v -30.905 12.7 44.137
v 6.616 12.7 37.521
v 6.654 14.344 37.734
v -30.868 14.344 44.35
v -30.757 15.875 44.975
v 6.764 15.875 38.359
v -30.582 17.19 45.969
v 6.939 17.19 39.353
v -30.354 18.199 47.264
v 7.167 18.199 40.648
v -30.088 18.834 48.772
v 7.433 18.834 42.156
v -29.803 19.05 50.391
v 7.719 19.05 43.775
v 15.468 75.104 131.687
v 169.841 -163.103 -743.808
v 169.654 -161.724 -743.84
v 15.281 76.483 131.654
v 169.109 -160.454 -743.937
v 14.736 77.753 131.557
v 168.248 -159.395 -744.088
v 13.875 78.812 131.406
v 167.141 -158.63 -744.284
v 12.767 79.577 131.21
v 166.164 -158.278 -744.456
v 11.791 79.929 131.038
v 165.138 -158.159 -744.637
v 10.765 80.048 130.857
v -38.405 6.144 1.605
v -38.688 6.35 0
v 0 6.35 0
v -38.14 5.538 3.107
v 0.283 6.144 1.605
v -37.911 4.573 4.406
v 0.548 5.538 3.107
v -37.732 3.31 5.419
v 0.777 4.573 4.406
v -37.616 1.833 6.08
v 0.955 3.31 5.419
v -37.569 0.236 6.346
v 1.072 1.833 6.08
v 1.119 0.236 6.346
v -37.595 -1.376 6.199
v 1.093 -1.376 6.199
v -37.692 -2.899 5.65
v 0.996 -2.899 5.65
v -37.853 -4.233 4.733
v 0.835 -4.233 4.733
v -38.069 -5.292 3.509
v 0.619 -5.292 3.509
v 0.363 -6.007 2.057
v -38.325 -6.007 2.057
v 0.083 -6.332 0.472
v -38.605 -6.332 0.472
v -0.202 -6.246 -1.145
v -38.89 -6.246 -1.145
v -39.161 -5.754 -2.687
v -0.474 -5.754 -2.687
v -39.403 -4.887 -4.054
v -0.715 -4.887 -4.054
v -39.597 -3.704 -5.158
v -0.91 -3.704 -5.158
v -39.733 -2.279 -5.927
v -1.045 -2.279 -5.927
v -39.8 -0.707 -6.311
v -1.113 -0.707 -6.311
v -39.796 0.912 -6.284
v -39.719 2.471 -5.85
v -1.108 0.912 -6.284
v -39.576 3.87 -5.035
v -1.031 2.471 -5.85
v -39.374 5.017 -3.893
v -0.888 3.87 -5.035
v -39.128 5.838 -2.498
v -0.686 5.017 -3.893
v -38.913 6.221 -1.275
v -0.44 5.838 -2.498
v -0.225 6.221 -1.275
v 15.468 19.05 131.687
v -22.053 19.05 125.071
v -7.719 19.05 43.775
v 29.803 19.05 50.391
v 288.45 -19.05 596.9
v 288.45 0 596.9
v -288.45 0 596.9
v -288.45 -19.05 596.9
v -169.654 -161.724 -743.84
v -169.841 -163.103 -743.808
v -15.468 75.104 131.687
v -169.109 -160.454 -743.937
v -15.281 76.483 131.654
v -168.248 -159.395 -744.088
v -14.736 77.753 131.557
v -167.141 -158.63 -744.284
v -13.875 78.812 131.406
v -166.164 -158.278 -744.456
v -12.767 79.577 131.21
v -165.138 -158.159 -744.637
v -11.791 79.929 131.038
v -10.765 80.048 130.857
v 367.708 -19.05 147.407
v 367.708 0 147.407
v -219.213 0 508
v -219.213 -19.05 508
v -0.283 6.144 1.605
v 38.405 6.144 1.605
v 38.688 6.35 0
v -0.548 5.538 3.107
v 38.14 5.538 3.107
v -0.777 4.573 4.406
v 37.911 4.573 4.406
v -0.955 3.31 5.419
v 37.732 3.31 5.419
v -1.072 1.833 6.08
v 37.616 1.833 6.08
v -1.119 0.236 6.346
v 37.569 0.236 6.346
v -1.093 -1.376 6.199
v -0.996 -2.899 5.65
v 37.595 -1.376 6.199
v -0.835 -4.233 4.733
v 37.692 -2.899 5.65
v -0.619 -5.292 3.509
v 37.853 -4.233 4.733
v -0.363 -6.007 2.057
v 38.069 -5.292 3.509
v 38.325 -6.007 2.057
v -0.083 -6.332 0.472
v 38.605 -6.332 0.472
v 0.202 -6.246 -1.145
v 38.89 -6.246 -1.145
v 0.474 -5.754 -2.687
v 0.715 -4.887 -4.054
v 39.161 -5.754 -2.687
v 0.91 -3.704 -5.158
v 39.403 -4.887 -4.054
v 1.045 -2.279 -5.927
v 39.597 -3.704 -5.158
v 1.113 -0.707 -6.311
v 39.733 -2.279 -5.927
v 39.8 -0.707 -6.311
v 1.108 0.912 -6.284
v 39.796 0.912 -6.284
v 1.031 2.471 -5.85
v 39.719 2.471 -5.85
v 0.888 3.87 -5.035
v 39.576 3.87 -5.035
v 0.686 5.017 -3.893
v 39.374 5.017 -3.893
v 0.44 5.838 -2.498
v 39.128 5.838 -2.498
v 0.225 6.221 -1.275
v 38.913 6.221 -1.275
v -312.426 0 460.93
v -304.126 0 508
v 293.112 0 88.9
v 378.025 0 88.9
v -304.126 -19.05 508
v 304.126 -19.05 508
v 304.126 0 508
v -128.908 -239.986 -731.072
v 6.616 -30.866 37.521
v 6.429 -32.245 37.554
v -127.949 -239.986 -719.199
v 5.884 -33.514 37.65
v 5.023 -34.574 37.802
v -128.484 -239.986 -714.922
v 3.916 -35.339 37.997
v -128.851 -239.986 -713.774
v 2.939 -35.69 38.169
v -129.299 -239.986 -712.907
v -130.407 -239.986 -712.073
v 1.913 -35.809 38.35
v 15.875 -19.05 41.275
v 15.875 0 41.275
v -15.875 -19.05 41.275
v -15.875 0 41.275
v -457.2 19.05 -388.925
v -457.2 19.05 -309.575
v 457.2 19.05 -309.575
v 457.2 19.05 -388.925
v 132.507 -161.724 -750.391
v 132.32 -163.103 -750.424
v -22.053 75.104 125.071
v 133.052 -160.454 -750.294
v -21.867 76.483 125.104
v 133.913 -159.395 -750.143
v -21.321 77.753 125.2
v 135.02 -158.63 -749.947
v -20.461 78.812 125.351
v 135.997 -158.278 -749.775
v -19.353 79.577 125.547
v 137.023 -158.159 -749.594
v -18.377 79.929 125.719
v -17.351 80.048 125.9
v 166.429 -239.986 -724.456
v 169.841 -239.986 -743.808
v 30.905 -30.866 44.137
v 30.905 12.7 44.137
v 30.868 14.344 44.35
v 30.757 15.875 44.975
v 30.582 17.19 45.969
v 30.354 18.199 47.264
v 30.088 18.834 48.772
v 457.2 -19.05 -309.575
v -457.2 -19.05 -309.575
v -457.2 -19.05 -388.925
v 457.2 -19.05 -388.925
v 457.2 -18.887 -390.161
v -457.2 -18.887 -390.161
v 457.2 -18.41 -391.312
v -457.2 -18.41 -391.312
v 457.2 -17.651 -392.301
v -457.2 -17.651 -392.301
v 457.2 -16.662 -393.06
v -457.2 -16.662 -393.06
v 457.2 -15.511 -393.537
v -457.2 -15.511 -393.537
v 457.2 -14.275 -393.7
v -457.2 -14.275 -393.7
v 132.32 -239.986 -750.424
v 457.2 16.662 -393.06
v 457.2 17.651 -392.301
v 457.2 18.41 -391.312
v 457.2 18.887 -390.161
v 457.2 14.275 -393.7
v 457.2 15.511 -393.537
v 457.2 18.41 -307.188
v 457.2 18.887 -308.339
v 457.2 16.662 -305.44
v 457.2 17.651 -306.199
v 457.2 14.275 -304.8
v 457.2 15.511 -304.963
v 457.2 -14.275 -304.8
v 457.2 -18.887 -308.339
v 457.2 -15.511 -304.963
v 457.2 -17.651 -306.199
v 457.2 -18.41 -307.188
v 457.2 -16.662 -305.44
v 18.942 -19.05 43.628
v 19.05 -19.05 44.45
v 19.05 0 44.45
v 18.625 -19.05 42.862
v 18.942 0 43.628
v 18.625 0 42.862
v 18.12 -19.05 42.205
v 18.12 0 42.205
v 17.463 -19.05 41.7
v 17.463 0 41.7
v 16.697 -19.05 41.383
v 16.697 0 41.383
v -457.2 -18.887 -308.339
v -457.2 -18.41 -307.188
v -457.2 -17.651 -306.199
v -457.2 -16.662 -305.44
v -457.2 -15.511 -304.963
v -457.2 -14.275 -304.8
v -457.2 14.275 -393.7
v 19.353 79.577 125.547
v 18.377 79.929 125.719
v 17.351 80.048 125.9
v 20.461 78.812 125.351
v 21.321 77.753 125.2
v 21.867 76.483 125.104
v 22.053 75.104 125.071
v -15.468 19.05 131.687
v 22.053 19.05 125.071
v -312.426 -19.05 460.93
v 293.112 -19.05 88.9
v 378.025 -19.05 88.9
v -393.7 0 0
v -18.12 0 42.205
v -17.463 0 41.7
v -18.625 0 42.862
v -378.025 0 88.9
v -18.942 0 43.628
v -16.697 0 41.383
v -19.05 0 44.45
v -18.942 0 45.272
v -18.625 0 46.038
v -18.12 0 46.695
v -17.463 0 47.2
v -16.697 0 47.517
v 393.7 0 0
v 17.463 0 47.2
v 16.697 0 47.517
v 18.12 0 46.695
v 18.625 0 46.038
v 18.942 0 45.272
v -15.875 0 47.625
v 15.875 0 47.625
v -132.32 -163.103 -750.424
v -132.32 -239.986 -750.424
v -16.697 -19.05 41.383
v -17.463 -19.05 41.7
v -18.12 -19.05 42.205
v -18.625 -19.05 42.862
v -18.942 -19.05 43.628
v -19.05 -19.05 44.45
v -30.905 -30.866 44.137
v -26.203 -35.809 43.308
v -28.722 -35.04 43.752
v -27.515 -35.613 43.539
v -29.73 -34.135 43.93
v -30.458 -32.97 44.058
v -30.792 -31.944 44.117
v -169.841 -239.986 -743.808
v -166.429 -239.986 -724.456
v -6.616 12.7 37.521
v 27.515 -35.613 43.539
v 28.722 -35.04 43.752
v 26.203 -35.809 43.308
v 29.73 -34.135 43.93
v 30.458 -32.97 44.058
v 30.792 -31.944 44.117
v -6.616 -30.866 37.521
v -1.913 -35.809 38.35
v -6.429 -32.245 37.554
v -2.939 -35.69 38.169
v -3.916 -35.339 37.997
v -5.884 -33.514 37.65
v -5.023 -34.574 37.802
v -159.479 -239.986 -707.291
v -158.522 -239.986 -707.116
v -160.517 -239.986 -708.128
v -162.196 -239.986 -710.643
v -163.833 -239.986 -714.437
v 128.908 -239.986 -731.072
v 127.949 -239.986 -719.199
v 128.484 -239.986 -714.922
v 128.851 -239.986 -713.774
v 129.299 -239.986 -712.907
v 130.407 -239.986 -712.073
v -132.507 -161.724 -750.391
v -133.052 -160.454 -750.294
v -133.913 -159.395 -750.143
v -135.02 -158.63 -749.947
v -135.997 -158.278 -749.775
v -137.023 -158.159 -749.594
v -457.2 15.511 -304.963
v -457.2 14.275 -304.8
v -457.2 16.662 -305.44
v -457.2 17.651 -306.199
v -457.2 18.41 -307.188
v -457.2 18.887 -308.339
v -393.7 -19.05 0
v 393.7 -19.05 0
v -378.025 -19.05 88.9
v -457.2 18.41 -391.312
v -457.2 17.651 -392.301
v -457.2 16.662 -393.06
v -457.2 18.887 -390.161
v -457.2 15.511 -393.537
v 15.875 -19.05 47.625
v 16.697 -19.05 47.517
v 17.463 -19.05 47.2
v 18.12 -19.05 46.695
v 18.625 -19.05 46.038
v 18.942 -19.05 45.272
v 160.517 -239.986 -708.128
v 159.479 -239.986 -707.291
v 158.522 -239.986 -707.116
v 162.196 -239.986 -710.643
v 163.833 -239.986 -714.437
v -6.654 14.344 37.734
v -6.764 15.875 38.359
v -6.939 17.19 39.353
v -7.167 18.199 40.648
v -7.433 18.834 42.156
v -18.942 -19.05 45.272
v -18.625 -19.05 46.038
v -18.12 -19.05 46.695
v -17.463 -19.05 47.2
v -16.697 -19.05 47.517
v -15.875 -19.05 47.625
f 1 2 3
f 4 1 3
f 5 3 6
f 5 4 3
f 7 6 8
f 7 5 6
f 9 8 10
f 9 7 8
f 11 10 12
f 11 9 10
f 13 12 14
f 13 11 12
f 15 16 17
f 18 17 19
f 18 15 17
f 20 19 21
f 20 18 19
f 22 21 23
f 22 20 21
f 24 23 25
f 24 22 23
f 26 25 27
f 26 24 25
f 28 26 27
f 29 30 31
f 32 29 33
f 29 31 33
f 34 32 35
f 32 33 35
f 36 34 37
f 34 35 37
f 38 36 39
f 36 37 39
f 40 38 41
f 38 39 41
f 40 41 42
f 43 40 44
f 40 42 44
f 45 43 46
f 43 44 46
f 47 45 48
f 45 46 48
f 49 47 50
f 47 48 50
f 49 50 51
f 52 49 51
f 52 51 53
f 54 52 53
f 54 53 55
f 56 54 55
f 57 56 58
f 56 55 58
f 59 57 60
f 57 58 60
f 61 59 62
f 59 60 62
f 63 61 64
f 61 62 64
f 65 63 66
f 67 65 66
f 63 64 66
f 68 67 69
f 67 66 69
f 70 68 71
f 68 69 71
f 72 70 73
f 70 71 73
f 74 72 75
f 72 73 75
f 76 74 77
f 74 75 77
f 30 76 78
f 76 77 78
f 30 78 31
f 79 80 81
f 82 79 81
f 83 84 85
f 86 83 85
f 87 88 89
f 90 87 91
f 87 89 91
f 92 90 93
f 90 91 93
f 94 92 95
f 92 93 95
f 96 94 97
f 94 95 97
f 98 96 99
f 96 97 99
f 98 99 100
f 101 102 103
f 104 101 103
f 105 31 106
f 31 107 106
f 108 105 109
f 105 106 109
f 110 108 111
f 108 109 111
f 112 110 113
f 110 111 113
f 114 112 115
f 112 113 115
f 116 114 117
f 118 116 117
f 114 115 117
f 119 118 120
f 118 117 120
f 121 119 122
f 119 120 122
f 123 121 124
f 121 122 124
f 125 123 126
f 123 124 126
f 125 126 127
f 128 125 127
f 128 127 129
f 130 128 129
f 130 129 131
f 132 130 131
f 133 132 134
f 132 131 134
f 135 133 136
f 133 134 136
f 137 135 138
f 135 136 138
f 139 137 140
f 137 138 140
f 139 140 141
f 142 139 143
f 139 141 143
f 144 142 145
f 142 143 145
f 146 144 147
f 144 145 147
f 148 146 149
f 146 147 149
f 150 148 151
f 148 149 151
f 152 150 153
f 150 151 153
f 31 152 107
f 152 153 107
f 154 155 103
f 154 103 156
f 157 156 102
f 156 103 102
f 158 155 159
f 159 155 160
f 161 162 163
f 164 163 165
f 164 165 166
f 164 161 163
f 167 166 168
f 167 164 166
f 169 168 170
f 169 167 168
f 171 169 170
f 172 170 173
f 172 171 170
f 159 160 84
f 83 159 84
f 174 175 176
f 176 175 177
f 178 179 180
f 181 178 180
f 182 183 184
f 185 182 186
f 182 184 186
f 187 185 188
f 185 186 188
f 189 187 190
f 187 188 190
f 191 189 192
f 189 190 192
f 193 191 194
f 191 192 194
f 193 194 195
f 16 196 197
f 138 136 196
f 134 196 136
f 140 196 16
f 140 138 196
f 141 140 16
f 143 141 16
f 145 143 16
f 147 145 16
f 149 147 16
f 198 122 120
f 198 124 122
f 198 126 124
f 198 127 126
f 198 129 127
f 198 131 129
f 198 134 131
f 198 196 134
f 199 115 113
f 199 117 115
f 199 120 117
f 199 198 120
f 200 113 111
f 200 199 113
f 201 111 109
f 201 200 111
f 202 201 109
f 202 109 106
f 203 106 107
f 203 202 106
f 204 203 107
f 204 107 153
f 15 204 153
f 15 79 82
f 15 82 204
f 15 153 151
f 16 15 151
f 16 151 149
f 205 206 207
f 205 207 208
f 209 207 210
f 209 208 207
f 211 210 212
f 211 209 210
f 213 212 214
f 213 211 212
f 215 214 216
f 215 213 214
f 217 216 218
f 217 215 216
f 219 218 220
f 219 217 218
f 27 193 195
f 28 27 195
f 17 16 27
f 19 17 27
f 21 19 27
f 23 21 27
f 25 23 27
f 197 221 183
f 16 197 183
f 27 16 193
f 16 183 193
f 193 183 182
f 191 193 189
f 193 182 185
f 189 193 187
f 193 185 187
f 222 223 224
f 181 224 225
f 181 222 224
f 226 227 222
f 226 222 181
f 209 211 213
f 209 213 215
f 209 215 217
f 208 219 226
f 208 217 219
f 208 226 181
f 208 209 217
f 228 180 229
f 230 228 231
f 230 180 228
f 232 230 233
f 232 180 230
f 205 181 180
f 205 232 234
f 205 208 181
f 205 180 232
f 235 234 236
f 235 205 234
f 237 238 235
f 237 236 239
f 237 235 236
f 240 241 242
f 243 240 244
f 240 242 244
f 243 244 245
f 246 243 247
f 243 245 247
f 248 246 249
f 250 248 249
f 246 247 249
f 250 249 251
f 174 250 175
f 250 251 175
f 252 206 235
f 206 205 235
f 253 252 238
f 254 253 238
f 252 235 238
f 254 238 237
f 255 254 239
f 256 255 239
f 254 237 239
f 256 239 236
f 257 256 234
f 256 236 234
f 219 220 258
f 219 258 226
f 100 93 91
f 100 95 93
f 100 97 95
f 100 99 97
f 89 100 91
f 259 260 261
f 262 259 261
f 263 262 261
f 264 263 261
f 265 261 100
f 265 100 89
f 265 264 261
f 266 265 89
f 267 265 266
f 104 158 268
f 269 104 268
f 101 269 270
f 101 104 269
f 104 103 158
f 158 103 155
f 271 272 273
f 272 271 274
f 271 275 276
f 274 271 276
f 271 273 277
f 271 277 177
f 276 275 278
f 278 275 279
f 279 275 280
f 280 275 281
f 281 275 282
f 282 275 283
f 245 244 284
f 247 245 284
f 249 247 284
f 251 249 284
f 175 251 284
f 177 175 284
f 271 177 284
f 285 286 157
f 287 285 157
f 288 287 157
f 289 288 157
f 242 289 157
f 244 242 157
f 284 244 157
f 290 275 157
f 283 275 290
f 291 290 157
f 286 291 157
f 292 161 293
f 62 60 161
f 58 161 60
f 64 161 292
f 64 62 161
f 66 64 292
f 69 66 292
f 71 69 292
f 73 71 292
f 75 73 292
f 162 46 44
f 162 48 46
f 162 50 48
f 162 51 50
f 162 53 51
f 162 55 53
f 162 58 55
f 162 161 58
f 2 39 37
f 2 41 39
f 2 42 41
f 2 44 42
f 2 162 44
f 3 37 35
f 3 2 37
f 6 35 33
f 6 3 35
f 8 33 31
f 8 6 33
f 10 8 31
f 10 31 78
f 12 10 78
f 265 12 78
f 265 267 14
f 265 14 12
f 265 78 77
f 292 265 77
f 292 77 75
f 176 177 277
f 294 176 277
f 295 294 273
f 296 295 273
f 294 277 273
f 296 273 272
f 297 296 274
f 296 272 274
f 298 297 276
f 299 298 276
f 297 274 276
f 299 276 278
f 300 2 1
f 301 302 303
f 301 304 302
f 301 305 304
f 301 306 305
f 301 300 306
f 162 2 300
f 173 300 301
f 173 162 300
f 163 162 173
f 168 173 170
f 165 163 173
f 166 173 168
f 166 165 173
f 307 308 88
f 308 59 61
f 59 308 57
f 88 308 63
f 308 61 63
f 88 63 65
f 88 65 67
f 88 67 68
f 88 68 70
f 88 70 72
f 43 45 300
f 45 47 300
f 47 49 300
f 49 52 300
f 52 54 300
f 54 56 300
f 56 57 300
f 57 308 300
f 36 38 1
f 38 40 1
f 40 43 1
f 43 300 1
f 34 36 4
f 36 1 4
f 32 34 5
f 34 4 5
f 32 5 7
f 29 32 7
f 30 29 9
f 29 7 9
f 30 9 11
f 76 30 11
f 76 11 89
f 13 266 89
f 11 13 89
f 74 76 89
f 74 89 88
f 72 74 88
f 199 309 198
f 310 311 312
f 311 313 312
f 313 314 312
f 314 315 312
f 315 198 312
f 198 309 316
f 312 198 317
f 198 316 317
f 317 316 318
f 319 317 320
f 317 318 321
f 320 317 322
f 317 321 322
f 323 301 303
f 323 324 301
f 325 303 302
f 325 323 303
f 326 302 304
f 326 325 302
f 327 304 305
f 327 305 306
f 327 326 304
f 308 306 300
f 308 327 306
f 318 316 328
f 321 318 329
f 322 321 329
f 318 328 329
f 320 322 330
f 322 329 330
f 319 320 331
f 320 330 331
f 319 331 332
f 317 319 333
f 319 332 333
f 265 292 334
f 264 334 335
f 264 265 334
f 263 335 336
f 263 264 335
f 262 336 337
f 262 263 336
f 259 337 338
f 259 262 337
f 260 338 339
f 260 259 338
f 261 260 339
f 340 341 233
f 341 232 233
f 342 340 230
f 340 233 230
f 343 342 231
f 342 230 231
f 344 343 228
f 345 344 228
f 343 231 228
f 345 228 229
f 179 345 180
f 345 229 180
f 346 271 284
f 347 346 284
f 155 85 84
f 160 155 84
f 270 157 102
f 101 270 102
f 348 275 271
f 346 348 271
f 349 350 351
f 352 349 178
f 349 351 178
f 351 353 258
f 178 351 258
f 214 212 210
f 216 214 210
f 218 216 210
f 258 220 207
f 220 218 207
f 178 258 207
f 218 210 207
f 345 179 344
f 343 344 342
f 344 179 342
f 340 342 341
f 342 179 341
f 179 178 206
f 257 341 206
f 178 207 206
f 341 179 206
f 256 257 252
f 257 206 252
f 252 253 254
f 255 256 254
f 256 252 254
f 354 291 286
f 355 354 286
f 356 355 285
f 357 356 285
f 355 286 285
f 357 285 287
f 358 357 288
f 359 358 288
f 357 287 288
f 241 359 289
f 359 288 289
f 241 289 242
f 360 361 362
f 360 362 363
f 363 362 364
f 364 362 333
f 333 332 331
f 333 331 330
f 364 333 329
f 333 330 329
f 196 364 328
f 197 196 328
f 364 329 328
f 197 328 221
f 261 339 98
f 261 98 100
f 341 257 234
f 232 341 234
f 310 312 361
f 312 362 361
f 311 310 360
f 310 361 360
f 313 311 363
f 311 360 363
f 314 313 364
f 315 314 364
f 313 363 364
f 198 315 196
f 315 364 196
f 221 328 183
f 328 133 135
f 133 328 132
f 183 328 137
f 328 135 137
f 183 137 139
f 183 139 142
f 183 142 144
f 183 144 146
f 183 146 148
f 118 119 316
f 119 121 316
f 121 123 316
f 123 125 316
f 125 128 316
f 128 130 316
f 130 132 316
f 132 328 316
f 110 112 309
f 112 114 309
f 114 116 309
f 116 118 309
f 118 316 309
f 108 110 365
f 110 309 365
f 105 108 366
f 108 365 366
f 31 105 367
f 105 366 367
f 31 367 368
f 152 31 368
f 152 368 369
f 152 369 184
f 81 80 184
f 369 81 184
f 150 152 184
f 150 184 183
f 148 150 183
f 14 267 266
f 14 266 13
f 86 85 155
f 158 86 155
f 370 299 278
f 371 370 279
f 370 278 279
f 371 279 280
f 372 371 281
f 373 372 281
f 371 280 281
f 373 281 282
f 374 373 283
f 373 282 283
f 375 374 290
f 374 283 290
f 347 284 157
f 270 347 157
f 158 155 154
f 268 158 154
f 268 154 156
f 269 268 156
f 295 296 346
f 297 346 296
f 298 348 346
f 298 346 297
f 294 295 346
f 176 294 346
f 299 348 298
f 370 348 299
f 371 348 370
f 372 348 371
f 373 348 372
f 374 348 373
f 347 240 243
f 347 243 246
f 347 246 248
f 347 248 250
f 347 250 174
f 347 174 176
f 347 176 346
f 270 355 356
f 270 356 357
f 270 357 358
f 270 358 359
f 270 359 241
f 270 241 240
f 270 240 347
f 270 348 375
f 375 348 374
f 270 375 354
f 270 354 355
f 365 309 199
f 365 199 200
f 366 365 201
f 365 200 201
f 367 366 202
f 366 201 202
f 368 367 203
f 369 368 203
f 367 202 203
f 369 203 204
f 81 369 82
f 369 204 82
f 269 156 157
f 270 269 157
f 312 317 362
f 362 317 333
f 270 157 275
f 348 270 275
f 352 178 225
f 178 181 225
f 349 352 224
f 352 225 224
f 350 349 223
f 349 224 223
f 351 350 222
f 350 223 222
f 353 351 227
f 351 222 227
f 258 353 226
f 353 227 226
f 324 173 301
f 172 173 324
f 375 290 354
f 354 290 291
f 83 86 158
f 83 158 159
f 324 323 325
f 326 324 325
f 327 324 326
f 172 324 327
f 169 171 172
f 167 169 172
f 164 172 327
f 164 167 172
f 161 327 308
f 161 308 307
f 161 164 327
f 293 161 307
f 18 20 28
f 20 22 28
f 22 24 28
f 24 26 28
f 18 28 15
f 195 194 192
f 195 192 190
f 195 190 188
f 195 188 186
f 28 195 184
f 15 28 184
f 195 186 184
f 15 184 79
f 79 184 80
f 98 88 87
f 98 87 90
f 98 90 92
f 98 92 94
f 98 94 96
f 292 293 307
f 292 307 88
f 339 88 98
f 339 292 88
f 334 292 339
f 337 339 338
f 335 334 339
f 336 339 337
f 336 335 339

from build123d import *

# Parameters (mm, degrees)
F5_DEPTH      = 38.1
F6_DEPTH      = 38.1
F7_R          = 6.35
F7_2_R        = 6.35
F8_R          = 6.35
F9_DEPTH      = 169.842086772
F9_DEPTH_BACK = 169.842086772
F11_DEPTH     = 19.05
F13_DEPTH     = 19.05
F15_DEPTH     = 19.05
F16_W         = 914.4
F16_H         = 88.9
F17_DEPTH     = 19.05
F18_R         = 4.7752
F18_2_R       = 4.7752
F18_3_R       = 4.7752


with BuildPart() as f5:
    # F3 (on line) → F5 (new body)
    with BuildSketch(Plane(origin=(0, 0, 0), x_dir=(0, 1, 0), z_dir=(0.984807753, 0, 0.1736481777))):
        Polygon((19.05, 38.1), (-35.8091619876, 38.1), (-239.9864466201, -723.9), (-239.9864466201, -762), (-158.1592584133, -762), (80.047573658, 127), (19.05, 127), align=None)
    extrude(amount=F5_DEPTH)

    # F7
    f7_edges = [f5.edges().sort_by_distance(p)[0] for p in [
        (12.144592, 19.05, 40.829173),
    ]]
    fillet(f7_edges, radius=F7_R)


with BuildPart() as f6:
    # F4 (on line) → F6 (new body)
    with BuildSketch(Plane(origin=(0, 0, 0), x_dir=(0, 1, 0), z_dir=(0.984807753, 0, -0.1736481777))):
        Polygon((19.05, 38.1), (-35.8091619876, 38.1), (-239.9864466201, -723.9), (-239.9864466201, -762), (-158.1592584133, -762), (80.047573658, 127), (19.05, 127), align=None)
    extrude(amount=-F6_DEPTH)

    # F7#2
    f7_2_edges = [f6.edges().sort_by_distance(p)[0] for p in [
        (-12.144592, 19.05, 40.829173),
    ]]
    fillet(f7_2_edges, radius=F7_2_R)


with BuildPart() as f9_tool:
    # F8 (on Right) → F9 (new body, two sides)
    with BuildSketch(Plane.YZ) as f9_sk:
        Circle(F8_R)
    extrude(amount=F9_DEPTH)
    extrude(f9_sk.sketch, amount=-F9_DEPTH_BACK)


with BuildPart() as f5_1:
    add(f5.part)

    # F9: cut by f9_tool
    add(f9_tool.part, mode=Mode.SUBTRACT)

    # F18
    f18_edges = [f5_1.edges().sort_by_distance(p)[0] for p in [
        (97.065136, -137.897804, -331.074583),
        (59.54396, -137.897804, -337.690579),
        (92.654472, -39.055842, -306.060466),
        (55.133296, -39.055842, -312.676462),
        (11.041926, 19.05, 47.082702),
    ]]
    fillet(f18_edges, radius=F18_R)


with BuildPart() as f6_1:
    add(f6.part)

    # F9: cut by f9_tool
    add(f9_tool.part, mode=Mode.SUBTRACT)

    # F18#2
    f18_2_edges = [f6_1.edges().sort_by_distance(p)[0] for p in [
        (-59.54396, -137.897804, -337.690579),
        (-55.133296, -39.055842, -312.676462),
        (-97.065136, -137.897804, -331.074583),
        (-92.654472, -39.055842, -306.060466),
    ]]
    fillet(f18_2_edges, radius=F18_2_R)


with BuildPart() as f11:
    # F10 (on Front) → F11 (new body)
    with BuildSketch(Plane.XZ):
        Polygon((378.024531415, 88.9), (-378.024531415, 88.9), (-393.7, 0), (393.7, 0), align=None)
        with BuildLine():
            ThreePointArc((19.05, 44.45), (18.1200640303, 42.2049359697), (15.875, 41.275))
            Line((15.875, 41.275), (-15.875, 41.275))
            ThreePointArc((-15.875, 41.275), (-18.1200640303, 42.2049359697), (-19.05, 44.45))
            ThreePointArc((-19.05, 44.45), (-18.1200640303, 46.6950640303), (-15.875, 47.625))
            Line((-15.875, 47.625), (15.875, 47.625))
            ThreePointArc((15.875, 47.625), (18.1200640303, 46.6950640303), (19.05, 44.45))
        make_face(mode=Mode.SUBTRACT)
    extrude(amount=F11_DEPTH)


with BuildPart() as f13:
    # F12 (on Front) → F13 (new body)
    with BuildSketch(Plane.XZ):
        Polygon((288.4504252151, 596.9), (-288.4504252151, 596.9), (-304.1258938001, 508), (304.1258938001, 508), align=None)
    extrude(amount=F13_DEPTH)


with BuildPart() as f15:
    # F14 (on Front) → F15 (new body)
    with BuildSketch(Plane.XZ):
        Polygon((-219.2128682677, 508), (-304.1258938001, 508), (-312.4255627119, 460.9302385914), (293.1115058827, 88.9), (378.024531415, 88.9), (367.708150879, 147.4071013782), align=None)
    extrude(amount=F15_DEPTH)


with BuildPart() as f17:
    # F16 (on Front) → F17 (new body, symmetric)
    with BuildSketch(Plane.XZ):
        with Locations((0, -349.25)):
            Rectangle(F16_W, F16_H)
    extrude(amount=F17_DEPTH, both=True)

    # F18#3
    f18_3_edges = [f17.edges().sort_by_distance(p)[0] for p in [
        (0, -19.05, -393.7),
        (0, -19.05, -304.8),
        (0, 19.05, -393.7),
        (0, 19.05, -304.8),
    ]]
    fillet(f18_3_edges, radius=F18_3_R)


solid = Compound([f5_1.part, f6_1.part, f11.part, f13.part, f15.part, f17.part])
